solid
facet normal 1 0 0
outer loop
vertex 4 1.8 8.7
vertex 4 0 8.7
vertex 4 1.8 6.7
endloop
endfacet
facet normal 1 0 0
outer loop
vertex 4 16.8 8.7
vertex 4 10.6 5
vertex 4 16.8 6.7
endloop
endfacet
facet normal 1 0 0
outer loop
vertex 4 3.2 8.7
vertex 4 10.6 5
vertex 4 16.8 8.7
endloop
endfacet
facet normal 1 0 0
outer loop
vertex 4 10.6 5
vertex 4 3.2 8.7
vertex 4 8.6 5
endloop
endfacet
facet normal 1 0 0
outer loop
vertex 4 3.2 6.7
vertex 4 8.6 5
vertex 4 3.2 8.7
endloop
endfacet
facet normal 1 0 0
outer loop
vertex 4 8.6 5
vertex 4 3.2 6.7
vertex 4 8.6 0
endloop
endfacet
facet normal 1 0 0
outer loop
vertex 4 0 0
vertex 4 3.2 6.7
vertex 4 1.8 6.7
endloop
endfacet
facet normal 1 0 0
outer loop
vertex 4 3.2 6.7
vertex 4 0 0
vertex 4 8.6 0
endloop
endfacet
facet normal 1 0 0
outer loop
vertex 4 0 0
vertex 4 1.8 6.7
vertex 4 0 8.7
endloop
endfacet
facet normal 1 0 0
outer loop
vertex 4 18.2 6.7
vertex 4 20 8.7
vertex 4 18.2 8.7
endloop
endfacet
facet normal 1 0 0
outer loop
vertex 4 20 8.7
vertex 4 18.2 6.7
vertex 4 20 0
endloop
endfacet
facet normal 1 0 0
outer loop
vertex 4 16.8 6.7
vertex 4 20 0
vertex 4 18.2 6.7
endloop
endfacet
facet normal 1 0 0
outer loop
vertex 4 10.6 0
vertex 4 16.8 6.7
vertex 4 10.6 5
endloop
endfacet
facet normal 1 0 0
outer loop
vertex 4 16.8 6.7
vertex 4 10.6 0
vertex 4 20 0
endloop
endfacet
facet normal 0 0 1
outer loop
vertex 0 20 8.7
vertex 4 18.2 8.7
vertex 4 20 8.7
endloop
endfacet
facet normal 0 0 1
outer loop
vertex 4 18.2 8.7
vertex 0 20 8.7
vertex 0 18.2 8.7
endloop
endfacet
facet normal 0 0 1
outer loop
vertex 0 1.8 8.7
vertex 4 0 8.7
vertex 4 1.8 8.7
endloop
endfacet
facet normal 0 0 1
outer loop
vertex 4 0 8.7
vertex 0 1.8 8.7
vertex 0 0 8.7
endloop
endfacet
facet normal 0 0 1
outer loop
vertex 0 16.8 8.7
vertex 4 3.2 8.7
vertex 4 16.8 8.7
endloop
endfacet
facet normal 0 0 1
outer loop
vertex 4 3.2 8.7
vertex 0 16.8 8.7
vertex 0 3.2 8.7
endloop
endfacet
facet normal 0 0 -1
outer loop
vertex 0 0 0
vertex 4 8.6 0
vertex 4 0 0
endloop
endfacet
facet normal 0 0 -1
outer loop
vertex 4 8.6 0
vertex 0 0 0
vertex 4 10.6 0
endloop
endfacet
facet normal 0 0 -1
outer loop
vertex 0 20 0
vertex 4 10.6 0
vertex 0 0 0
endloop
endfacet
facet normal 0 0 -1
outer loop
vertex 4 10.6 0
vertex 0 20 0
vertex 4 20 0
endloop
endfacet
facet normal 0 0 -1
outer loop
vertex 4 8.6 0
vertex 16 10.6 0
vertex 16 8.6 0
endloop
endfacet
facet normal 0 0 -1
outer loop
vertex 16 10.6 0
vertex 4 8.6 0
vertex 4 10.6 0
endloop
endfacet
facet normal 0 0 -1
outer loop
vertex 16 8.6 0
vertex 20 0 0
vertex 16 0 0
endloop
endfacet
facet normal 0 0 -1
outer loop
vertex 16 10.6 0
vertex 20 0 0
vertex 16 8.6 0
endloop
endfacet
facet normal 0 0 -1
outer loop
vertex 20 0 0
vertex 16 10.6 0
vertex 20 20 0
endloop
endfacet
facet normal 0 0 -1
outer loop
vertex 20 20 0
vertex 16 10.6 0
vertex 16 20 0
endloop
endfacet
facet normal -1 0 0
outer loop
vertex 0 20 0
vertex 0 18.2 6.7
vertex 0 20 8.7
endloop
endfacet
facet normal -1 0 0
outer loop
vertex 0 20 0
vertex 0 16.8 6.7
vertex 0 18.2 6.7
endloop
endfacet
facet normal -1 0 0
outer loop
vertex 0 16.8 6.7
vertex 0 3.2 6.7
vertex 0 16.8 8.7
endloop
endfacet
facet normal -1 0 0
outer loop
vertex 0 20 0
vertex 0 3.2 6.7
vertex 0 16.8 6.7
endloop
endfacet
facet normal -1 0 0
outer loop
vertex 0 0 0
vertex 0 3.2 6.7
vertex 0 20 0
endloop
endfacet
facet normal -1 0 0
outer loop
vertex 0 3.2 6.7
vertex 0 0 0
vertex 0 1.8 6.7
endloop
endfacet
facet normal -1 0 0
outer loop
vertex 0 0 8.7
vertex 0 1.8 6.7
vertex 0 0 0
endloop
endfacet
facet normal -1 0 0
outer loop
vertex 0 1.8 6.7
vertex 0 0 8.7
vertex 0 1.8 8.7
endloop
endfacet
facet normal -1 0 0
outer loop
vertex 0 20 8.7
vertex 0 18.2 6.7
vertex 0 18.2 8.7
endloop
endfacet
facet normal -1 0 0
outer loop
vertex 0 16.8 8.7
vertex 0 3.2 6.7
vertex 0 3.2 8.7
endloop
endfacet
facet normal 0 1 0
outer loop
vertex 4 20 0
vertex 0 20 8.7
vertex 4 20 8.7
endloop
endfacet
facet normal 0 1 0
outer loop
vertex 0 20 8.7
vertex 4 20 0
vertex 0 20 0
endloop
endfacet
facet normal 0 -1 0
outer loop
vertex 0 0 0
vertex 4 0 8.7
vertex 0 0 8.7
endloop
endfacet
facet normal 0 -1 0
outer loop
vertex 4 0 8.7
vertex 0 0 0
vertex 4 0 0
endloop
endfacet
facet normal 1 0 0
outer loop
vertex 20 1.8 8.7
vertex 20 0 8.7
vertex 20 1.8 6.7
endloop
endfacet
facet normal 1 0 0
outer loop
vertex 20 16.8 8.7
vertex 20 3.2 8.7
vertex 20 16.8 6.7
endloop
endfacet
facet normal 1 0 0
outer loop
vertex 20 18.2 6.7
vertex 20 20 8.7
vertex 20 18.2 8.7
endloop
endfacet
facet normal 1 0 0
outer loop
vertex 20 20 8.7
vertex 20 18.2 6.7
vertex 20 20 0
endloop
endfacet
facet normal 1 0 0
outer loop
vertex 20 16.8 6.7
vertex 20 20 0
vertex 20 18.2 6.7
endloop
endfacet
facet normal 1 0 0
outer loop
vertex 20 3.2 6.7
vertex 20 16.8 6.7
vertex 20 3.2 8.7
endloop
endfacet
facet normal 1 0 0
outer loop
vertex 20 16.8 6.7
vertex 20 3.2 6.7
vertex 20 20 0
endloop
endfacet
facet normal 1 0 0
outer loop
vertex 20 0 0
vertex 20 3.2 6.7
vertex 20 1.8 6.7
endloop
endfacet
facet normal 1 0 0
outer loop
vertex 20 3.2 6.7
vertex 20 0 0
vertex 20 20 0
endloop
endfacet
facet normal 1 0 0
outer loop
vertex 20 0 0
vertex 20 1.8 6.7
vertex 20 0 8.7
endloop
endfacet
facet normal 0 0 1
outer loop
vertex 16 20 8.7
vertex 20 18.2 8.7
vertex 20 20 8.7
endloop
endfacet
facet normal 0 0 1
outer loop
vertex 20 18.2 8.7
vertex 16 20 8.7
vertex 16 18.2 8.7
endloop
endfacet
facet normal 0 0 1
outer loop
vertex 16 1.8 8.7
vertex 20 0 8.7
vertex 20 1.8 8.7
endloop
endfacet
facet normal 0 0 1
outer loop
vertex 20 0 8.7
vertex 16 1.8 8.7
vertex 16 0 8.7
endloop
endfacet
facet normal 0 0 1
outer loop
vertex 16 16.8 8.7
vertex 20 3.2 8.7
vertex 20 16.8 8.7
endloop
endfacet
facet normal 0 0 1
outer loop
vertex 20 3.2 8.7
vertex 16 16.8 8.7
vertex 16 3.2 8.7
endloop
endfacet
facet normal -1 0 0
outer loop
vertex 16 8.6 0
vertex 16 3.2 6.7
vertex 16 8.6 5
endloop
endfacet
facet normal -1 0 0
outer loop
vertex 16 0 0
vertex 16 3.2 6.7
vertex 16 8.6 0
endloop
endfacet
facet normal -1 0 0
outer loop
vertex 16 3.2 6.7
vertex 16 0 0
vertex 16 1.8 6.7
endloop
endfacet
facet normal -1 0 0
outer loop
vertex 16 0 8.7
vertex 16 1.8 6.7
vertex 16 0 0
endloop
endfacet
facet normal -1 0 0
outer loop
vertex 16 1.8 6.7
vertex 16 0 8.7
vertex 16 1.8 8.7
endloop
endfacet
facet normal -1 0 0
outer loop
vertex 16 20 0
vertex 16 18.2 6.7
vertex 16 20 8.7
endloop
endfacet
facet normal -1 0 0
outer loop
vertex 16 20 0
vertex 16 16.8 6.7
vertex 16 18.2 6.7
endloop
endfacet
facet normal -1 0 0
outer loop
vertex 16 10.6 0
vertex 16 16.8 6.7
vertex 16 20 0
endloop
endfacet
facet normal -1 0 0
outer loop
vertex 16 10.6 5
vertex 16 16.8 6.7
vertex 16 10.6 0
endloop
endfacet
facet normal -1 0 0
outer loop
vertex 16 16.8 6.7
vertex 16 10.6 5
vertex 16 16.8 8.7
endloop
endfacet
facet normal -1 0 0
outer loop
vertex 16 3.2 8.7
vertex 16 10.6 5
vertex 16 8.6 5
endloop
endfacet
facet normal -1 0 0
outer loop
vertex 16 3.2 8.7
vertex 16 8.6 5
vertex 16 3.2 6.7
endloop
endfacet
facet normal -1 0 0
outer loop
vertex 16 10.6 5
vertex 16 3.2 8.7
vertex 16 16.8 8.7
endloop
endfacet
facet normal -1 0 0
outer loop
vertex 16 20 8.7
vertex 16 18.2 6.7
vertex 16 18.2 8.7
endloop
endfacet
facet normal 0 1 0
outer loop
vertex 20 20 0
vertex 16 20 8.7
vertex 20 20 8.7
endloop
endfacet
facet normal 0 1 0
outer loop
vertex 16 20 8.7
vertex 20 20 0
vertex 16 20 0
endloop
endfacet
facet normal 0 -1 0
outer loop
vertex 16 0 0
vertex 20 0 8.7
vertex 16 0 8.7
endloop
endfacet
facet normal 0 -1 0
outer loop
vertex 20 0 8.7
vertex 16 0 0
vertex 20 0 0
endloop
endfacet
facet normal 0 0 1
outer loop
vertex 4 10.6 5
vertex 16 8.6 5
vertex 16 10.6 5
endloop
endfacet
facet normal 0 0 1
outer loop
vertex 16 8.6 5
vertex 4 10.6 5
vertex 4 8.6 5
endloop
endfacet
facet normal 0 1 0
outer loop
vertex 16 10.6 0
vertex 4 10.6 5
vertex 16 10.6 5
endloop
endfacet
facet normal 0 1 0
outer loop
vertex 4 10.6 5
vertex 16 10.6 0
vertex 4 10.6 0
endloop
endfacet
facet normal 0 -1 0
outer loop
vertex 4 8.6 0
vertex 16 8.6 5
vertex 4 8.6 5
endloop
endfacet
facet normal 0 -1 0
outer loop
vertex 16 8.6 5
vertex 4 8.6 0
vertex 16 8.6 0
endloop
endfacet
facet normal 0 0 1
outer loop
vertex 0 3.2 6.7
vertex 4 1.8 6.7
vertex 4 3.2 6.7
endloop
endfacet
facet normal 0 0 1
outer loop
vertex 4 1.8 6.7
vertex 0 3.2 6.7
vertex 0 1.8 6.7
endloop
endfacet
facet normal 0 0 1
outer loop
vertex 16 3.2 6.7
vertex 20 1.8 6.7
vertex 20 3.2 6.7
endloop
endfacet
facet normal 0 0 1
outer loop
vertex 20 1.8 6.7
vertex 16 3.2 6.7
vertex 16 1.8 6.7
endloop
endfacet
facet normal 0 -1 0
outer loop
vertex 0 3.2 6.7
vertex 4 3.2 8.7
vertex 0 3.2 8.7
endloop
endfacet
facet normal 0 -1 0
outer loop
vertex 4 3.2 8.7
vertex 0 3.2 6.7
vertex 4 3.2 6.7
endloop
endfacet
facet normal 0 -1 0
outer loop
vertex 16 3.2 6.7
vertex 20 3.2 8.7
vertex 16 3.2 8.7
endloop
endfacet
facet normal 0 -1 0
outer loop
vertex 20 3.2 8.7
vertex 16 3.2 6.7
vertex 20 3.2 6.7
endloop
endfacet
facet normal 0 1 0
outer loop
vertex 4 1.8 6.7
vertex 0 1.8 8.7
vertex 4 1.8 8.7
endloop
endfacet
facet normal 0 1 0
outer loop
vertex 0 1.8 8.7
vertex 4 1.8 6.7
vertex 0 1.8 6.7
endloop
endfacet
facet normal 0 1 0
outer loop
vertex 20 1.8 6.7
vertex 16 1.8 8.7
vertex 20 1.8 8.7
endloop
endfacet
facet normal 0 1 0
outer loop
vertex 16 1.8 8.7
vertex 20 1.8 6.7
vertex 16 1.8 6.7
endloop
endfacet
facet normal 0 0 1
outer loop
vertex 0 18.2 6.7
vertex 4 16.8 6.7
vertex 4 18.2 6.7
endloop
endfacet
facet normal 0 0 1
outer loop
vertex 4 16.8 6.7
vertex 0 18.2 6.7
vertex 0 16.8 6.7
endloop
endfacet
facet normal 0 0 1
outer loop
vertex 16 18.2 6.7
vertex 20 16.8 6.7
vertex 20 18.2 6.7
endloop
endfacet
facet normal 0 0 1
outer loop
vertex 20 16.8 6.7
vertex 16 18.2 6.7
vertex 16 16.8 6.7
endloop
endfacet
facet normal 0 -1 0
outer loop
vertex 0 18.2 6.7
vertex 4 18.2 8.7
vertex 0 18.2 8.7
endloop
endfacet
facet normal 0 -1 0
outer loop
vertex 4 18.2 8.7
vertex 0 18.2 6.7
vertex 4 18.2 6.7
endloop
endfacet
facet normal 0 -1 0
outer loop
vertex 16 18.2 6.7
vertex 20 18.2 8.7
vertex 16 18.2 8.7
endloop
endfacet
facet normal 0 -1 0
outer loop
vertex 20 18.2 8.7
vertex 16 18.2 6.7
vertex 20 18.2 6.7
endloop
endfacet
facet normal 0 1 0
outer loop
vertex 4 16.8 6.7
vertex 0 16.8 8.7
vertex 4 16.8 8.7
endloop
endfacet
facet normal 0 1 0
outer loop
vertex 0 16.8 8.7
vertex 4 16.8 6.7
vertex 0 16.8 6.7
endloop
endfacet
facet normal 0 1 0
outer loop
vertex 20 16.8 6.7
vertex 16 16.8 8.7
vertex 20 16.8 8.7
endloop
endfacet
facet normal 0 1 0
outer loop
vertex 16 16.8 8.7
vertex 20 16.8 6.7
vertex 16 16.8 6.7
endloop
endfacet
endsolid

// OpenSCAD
difference(){
    union() {
        cube([4, 20, 8.7]);
        translate([11+5,0,0])cube([4, 20, 8.7]);
        translate([0,1.8+(16-1-1.4)/2,0])cube([18,2,5]);
    }
    #translate([-1,1.8,6.7])cube([40,1.4,10]);
    #translate([-1,2+16-1.2,6.7])cube([40,1.4,10]);
}
